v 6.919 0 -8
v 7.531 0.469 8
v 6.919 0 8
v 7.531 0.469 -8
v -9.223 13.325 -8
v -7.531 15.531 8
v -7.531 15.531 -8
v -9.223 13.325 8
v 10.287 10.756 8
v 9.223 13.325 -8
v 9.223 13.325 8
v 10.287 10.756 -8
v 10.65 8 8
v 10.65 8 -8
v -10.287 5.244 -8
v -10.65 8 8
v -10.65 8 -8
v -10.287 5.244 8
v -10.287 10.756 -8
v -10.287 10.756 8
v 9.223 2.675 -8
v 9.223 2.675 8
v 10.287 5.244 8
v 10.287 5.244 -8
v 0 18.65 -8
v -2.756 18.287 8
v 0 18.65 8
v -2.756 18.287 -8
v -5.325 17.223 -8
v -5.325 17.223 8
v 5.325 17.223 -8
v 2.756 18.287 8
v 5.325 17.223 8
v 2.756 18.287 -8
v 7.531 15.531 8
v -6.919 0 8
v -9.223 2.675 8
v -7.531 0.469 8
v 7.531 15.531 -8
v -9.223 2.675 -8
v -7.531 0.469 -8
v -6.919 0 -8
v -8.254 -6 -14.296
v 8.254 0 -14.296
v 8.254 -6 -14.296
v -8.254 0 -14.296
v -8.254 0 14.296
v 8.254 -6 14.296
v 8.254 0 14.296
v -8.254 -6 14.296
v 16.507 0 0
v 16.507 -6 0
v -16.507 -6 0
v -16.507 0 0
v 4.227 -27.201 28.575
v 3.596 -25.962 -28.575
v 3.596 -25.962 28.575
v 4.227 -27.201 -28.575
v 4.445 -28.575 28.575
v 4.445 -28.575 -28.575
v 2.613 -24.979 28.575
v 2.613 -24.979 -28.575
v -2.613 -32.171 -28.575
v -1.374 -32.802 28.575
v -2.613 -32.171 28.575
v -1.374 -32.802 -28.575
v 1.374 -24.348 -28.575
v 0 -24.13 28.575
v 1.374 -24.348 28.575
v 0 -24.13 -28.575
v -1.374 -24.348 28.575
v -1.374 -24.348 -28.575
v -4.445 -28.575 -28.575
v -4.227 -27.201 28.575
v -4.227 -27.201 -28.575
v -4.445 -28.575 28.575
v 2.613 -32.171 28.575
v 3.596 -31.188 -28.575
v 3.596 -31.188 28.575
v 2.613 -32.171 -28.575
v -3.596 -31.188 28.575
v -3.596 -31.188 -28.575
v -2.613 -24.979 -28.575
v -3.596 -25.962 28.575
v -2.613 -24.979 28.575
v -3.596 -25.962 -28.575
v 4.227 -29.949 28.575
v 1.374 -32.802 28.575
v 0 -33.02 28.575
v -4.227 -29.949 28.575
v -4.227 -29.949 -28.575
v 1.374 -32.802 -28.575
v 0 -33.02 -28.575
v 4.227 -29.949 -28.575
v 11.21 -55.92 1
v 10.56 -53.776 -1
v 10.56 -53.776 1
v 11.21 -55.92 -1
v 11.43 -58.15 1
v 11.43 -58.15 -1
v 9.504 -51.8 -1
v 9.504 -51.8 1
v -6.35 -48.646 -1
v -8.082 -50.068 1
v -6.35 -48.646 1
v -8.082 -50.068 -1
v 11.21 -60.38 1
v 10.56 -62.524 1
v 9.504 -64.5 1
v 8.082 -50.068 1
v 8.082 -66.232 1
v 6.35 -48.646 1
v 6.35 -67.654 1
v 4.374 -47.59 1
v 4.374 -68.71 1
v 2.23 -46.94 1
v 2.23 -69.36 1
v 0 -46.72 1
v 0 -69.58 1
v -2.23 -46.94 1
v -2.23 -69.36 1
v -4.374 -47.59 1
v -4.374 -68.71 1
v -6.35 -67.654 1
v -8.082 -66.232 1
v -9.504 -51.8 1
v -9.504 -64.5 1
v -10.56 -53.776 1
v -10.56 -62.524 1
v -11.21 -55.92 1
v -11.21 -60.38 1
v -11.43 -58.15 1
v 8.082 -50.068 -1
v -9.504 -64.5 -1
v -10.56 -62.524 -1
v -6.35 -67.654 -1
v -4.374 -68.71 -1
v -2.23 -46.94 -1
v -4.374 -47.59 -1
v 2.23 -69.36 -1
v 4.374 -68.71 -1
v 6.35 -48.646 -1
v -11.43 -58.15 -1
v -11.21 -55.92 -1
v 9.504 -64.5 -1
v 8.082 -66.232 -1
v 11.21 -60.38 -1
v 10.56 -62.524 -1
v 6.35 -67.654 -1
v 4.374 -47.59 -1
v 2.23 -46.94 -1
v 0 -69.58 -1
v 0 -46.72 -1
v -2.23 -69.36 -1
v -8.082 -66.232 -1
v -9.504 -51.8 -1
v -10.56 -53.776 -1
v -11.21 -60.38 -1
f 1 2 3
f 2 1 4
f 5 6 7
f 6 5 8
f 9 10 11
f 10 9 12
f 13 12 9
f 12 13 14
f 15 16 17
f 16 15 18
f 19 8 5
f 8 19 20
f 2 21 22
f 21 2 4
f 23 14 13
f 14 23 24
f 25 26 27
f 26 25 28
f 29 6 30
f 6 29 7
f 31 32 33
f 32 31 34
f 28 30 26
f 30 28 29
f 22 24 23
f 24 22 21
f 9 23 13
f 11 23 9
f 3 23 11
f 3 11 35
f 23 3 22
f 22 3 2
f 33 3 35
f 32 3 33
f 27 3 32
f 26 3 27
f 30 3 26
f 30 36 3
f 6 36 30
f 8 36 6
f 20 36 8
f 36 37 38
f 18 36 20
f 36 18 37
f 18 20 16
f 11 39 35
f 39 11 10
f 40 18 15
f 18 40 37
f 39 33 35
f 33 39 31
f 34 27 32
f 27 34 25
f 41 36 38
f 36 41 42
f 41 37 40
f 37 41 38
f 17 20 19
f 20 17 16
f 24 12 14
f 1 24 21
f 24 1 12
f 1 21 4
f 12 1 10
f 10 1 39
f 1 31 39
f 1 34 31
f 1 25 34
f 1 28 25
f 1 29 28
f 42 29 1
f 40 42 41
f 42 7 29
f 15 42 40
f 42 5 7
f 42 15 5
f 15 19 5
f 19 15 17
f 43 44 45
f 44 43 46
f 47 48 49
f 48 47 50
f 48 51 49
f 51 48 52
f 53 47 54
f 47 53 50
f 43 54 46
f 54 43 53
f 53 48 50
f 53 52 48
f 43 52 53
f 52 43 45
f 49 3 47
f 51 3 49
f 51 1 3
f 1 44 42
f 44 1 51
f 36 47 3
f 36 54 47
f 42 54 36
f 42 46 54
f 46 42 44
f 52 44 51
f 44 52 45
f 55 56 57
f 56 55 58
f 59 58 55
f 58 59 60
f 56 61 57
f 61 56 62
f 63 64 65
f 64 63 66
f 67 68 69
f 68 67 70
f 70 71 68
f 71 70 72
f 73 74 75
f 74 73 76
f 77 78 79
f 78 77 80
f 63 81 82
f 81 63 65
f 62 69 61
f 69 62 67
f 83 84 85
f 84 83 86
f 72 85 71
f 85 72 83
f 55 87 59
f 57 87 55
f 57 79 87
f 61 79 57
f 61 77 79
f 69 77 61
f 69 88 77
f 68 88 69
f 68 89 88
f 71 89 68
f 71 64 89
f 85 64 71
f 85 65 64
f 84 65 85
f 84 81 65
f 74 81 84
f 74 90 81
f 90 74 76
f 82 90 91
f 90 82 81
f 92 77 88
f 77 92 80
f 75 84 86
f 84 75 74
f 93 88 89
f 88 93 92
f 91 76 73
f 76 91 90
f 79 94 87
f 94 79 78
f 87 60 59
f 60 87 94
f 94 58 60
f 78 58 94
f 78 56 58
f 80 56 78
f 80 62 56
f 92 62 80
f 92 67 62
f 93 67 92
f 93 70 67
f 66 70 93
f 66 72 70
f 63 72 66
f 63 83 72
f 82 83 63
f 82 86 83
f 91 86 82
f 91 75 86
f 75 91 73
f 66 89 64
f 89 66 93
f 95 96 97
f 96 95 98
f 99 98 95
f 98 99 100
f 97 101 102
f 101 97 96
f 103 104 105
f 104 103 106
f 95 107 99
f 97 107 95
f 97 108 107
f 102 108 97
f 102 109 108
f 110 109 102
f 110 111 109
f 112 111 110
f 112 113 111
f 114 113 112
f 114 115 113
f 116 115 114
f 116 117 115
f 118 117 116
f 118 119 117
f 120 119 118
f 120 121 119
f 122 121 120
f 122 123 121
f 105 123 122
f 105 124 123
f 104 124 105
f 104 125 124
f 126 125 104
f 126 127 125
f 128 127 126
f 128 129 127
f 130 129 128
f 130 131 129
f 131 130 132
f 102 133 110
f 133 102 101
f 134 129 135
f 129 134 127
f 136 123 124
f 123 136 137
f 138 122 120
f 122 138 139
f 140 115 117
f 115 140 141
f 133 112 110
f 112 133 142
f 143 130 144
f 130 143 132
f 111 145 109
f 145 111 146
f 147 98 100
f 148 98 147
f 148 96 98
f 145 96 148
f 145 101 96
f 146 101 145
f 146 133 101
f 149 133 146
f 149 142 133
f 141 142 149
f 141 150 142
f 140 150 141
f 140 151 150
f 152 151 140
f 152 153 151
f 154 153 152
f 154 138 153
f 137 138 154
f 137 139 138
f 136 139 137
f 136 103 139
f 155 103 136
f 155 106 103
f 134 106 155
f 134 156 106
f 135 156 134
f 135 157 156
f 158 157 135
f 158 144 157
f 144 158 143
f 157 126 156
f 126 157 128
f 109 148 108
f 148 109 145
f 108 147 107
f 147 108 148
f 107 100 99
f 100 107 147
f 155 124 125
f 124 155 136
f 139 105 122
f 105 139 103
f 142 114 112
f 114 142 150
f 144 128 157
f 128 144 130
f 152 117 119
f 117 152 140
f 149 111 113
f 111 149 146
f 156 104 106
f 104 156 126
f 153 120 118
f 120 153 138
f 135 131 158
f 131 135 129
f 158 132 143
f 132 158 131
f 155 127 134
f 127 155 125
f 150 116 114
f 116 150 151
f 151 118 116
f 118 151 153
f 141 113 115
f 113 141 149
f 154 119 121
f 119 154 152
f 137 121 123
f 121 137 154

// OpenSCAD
// Auto-generated by scripts/author_from_manifest.py (Phase D.3).
// Source: data/phase_d_manifest.json (sku_intent='tyco-ty3251-pendent-155f').
// Do not hand-edit — regenerate from the manifest.
//
// @part tyco_ty3251_pendent_155f
// @kind sprinkler_head
// @category head.pendant.k56
// @display-name "Tyco TY3251 Pendent K5.6 SR 155°F"
// @mfg tyco_fire_protection
// @mfg-pn TY3251
// @listing UL FM
// @hazard-classes LH OH1
// @price-usd 14.20
// @install-minutes 8
// @crew journeyman
// @k-factor 5.6
// @orientation pendant
// @response standard
// @temperature 155F
// @param size_in number default=0.5 label="Size" unit="in"
// @port inlet position=[0,0.014,0] direction=[0,1,0] style=NPT_threaded size_in=0.5 role=drop

size_in = 0.5;
k_factor = 5.6;

length_mm   = 57.15;
body_dia_mm = 25.40;
thread_od   = 21.3;
thread_len  = 16;
deflector_d = body_dia_mm * 0.9;

 union() {
    translate([0, thread_len/2, 0])
        cylinder(h = thread_len, d = thread_od, center = true, $fn = 24);
    translate([0, -3, 0])
        rotate([90, 0, 0])
        cylinder(h = 6, d = thread_od * 1.55, $fn = 6, center = true);
    translate([0, -length_mm/2, 0])
        cylinder(h = length_mm, d = body_dia_mm * 0.35, center = true, $fn = 20);
    translate([0, -length_mm - 1, 0])
        cylinder(h = 2, d = deflector_d, center = true, $fn = 32);
}
